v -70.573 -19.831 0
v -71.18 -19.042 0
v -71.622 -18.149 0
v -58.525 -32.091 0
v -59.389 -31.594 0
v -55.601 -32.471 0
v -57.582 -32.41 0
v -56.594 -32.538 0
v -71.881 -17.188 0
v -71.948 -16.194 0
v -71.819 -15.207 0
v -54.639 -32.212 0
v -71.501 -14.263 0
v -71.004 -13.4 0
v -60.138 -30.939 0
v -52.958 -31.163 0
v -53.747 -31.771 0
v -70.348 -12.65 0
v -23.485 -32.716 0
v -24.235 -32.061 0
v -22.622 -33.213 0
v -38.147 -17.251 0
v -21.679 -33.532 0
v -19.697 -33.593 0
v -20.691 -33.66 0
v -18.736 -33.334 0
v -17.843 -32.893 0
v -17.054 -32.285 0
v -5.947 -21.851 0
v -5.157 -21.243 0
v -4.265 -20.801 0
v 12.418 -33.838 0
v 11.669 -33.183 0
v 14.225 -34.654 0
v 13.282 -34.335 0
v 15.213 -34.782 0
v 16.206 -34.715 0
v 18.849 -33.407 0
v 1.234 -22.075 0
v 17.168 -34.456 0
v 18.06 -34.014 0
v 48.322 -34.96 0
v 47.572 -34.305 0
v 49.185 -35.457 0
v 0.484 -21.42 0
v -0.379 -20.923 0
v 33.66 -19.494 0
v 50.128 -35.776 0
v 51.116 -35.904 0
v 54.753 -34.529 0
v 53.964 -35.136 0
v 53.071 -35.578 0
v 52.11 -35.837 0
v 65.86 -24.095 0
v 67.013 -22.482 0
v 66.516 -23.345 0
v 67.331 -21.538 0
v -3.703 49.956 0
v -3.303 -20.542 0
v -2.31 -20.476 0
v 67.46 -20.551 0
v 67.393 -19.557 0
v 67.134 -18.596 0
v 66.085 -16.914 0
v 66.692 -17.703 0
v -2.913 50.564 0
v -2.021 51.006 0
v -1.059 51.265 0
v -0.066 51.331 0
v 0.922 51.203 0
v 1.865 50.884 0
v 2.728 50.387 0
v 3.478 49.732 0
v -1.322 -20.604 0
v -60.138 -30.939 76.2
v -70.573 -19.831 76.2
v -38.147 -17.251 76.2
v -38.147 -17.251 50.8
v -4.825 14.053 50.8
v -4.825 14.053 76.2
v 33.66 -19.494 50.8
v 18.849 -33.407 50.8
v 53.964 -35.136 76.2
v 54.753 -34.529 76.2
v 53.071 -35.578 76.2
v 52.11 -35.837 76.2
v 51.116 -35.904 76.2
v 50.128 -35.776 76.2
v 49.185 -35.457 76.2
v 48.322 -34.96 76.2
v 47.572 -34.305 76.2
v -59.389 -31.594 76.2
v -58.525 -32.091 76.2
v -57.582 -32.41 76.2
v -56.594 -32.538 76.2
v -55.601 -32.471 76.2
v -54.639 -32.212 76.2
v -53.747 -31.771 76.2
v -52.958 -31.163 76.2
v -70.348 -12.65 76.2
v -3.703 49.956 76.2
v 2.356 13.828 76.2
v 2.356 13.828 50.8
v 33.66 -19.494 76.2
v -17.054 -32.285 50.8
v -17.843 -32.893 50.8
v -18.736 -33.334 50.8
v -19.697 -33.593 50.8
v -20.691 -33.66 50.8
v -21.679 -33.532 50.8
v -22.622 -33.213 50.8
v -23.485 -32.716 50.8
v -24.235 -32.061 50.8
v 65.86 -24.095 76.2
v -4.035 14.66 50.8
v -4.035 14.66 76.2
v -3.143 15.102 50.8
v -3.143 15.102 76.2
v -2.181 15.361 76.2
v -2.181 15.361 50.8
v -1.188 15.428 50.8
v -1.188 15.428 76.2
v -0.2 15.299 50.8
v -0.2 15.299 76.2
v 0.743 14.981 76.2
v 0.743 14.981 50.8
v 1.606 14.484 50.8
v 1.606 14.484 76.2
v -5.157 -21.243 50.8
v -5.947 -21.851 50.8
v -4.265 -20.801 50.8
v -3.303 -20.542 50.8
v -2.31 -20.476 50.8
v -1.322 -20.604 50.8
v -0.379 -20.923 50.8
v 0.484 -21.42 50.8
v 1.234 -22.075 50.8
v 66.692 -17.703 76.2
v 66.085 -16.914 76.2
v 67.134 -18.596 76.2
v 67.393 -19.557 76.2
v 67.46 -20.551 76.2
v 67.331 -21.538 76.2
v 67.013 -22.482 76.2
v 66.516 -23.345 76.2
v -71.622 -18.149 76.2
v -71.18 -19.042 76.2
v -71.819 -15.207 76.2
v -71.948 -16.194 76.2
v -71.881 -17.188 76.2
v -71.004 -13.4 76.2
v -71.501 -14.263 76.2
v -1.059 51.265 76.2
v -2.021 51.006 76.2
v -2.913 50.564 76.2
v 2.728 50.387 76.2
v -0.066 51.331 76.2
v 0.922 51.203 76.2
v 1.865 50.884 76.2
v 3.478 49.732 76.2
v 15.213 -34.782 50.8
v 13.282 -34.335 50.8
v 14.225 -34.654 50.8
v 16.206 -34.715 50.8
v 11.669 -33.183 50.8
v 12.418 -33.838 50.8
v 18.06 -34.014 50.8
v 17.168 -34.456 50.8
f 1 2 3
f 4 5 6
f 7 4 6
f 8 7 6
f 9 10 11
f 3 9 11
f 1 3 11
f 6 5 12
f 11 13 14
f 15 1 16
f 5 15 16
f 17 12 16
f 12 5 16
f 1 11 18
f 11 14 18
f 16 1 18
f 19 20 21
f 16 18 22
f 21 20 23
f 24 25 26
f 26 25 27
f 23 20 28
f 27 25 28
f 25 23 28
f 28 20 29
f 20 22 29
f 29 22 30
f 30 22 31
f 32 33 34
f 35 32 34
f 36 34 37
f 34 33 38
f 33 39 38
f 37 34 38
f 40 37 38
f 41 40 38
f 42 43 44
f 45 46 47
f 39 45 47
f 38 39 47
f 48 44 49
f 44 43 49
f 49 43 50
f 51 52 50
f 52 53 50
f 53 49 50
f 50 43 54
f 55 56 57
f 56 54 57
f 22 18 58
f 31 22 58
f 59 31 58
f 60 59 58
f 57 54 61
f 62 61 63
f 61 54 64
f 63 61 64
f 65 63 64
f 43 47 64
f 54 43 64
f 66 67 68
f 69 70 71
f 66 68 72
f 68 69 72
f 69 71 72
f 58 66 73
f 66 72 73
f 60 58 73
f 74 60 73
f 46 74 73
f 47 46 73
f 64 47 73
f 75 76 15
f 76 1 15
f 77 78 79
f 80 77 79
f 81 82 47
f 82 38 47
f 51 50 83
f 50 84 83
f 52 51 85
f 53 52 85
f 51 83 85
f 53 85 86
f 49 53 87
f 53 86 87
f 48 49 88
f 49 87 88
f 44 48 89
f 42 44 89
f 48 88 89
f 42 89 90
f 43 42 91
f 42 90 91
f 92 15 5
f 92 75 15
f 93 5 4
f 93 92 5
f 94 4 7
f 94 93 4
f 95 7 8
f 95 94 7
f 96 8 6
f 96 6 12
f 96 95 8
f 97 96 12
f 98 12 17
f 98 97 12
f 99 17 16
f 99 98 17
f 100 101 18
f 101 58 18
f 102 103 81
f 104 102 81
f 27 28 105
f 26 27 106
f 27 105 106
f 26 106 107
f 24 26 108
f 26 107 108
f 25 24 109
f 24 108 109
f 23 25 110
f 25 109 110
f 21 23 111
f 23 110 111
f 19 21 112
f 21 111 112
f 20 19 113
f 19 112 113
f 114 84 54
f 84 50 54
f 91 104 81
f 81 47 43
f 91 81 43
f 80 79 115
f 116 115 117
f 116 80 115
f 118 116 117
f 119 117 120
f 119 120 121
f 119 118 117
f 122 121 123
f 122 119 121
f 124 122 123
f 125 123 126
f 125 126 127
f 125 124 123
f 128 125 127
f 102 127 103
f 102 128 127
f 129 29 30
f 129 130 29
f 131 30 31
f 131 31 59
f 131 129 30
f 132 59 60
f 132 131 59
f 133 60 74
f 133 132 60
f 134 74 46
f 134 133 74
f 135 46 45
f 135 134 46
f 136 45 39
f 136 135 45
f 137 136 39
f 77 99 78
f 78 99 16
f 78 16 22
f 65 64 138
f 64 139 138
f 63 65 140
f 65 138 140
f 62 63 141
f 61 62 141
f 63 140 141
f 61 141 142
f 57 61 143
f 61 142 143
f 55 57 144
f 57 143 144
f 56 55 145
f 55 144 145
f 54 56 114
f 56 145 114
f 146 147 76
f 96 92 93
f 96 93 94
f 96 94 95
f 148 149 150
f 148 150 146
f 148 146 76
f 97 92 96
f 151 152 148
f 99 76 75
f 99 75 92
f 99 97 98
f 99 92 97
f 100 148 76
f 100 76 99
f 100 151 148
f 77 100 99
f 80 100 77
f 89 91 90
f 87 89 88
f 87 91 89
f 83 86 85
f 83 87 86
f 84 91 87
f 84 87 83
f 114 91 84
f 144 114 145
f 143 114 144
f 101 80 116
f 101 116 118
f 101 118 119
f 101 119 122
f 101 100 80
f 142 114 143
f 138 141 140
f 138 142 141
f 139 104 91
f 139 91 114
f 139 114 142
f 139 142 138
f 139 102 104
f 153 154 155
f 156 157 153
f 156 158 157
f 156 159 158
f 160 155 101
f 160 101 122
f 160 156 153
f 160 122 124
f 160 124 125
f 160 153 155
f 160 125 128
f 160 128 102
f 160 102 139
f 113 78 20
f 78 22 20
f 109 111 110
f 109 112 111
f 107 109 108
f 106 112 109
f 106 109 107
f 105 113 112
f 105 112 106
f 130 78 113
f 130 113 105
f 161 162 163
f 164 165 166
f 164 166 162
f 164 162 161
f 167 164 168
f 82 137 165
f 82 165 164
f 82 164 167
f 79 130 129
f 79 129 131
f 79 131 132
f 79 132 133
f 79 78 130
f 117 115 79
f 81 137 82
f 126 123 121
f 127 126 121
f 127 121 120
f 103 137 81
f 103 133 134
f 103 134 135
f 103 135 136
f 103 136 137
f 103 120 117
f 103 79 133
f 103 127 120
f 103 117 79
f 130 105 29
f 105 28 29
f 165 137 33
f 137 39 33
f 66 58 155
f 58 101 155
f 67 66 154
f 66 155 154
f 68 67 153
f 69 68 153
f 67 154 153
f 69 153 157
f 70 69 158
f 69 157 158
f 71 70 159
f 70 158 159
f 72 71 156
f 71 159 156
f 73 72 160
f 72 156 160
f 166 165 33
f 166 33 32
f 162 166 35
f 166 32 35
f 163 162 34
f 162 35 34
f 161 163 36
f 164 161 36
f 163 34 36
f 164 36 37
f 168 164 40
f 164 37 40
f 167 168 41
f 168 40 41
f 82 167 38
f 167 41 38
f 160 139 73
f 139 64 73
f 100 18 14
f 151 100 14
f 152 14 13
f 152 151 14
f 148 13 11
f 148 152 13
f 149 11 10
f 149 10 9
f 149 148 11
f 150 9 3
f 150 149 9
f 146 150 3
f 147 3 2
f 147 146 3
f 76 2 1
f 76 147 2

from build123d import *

# Parameters (mm, degrees)
F1_DEPTH = 25.4
F3_DEPTH = 25.4
F5_DEPTH = 50.8
F6_R     = 5.08
F7_R     = 5.08
F8_R     = 5.08
F9_R     = 5.08
F10_R    = 5.08
F11_R    = 5.08
F12_R    = 5.08
F13_R    = 5.08
F14_R    = 5.08


with BuildPart() as f1:
    # F0 (on Top) → F1 (new body)
    with BuildSketch(Plane.XY):
        Polygon((69.5630275399, -20.6164596444), (0, 53.434503884), (-74.0509635284, -16.1285236559), (-56.6602066435, -34.641264538), (-38.1474657613, -17.250507653), (-20.7567088764, -35.7632485351), (-2.2439679943, -18.3724916501), (15.1467888907, -36.8852325322), (33.6595297728, -19.4944756473), (51.0502866578, -38.0072165294), align=None)
    extrude(amount=F1_DEPTH)

    # F2 (on face) → F3 (join)
    with BuildSketch(Plane.XY.offset(25.4)):
        Polygon((-1.1219839971, 17.5310061169), (-38.1474657613, -17.250507653), (-20.7567088764, -35.7632485351), (-2.2439679943, -18.3724916501), (15.1467888907, -36.8852325322), (33.6595297728, -19.4944756473), align=None)
    extrude(amount=F3_DEPTH)

    # F4 (on face) → F5 (join)
    with BuildSketch(Plane.XY.offset(25.4)):
        Polygon((33.6595297728, -19.4944756473), (51.0502866578, -38.0072165294), (69.5630275399, -20.6164596444), (0, 53.434503884), (-74.0509635284, -16.1285236559), (-56.6602066435, -34.641264538), (-38.1474657613, -17.250507653), (-1.1219839971, 17.5310061169), align=None)
    extrude(amount=F5_DEPTH)

    # F6
    f6_edges = [f1.edges().sort_by_distance(p)[0] for p in [
        (-1.121984, 17.531006, 63.5),
    ]]
    fillet(f6_edges, radius=F6_R)

    # F7
    f7_edges = [f1.edges().sort_by_distance(p)[0] for p in [
        (-2.243968, -18.372492, 25.4),
    ]]
    fillet(f7_edges, radius=F7_R)

    # F8
    f8_edges = [f1.edges().sort_by_distance(p)[0] for p in [
        (15.146789, -36.885233, 25.4),
    ]]
    fillet(f8_edges, radius=F8_R)

    # F9
    f9_edges = [f1.edges().sort_by_distance(p)[0] for p in [
        (-20.756709, -35.763249, 25.4),
    ]]
    fillet(f9_edges, radius=F9_R)

    # F10
    f10_edges = [f1.edges().sort_by_distance(p)[0] for p in [
        (0, 53.434504, 38.1),
    ]]
    fillet(f10_edges, radius=F10_R)

    # F11
    f11_edges = [f1.edges().sort_by_distance(p)[0] for p in [
        (-74.050964, -16.128524, 38.1),
    ]]
    fillet(f11_edges, radius=F11_R)

    # F12
    f12_edges = [f1.edges().sort_by_distance(p)[0] for p in [
        (69.563028, -20.61646, 38.1),
    ]]
    fillet(f12_edges, radius=F12_R)

    # F13
    f13_edges = [f1.edges().sort_by_distance(p)[0] for p in [
        (-56.660207, -34.641265, 38.1),
    ]]
    fillet(f13_edges, radius=F13_R)

    # F14
    f14_edges = [f1.edges().sort_by_distance(p)[0] for p in [
        (51.050287, -38.007217, 38.1),
    ]]
    fillet(f14_edges, radius=F14_R)


solid = f1.part
